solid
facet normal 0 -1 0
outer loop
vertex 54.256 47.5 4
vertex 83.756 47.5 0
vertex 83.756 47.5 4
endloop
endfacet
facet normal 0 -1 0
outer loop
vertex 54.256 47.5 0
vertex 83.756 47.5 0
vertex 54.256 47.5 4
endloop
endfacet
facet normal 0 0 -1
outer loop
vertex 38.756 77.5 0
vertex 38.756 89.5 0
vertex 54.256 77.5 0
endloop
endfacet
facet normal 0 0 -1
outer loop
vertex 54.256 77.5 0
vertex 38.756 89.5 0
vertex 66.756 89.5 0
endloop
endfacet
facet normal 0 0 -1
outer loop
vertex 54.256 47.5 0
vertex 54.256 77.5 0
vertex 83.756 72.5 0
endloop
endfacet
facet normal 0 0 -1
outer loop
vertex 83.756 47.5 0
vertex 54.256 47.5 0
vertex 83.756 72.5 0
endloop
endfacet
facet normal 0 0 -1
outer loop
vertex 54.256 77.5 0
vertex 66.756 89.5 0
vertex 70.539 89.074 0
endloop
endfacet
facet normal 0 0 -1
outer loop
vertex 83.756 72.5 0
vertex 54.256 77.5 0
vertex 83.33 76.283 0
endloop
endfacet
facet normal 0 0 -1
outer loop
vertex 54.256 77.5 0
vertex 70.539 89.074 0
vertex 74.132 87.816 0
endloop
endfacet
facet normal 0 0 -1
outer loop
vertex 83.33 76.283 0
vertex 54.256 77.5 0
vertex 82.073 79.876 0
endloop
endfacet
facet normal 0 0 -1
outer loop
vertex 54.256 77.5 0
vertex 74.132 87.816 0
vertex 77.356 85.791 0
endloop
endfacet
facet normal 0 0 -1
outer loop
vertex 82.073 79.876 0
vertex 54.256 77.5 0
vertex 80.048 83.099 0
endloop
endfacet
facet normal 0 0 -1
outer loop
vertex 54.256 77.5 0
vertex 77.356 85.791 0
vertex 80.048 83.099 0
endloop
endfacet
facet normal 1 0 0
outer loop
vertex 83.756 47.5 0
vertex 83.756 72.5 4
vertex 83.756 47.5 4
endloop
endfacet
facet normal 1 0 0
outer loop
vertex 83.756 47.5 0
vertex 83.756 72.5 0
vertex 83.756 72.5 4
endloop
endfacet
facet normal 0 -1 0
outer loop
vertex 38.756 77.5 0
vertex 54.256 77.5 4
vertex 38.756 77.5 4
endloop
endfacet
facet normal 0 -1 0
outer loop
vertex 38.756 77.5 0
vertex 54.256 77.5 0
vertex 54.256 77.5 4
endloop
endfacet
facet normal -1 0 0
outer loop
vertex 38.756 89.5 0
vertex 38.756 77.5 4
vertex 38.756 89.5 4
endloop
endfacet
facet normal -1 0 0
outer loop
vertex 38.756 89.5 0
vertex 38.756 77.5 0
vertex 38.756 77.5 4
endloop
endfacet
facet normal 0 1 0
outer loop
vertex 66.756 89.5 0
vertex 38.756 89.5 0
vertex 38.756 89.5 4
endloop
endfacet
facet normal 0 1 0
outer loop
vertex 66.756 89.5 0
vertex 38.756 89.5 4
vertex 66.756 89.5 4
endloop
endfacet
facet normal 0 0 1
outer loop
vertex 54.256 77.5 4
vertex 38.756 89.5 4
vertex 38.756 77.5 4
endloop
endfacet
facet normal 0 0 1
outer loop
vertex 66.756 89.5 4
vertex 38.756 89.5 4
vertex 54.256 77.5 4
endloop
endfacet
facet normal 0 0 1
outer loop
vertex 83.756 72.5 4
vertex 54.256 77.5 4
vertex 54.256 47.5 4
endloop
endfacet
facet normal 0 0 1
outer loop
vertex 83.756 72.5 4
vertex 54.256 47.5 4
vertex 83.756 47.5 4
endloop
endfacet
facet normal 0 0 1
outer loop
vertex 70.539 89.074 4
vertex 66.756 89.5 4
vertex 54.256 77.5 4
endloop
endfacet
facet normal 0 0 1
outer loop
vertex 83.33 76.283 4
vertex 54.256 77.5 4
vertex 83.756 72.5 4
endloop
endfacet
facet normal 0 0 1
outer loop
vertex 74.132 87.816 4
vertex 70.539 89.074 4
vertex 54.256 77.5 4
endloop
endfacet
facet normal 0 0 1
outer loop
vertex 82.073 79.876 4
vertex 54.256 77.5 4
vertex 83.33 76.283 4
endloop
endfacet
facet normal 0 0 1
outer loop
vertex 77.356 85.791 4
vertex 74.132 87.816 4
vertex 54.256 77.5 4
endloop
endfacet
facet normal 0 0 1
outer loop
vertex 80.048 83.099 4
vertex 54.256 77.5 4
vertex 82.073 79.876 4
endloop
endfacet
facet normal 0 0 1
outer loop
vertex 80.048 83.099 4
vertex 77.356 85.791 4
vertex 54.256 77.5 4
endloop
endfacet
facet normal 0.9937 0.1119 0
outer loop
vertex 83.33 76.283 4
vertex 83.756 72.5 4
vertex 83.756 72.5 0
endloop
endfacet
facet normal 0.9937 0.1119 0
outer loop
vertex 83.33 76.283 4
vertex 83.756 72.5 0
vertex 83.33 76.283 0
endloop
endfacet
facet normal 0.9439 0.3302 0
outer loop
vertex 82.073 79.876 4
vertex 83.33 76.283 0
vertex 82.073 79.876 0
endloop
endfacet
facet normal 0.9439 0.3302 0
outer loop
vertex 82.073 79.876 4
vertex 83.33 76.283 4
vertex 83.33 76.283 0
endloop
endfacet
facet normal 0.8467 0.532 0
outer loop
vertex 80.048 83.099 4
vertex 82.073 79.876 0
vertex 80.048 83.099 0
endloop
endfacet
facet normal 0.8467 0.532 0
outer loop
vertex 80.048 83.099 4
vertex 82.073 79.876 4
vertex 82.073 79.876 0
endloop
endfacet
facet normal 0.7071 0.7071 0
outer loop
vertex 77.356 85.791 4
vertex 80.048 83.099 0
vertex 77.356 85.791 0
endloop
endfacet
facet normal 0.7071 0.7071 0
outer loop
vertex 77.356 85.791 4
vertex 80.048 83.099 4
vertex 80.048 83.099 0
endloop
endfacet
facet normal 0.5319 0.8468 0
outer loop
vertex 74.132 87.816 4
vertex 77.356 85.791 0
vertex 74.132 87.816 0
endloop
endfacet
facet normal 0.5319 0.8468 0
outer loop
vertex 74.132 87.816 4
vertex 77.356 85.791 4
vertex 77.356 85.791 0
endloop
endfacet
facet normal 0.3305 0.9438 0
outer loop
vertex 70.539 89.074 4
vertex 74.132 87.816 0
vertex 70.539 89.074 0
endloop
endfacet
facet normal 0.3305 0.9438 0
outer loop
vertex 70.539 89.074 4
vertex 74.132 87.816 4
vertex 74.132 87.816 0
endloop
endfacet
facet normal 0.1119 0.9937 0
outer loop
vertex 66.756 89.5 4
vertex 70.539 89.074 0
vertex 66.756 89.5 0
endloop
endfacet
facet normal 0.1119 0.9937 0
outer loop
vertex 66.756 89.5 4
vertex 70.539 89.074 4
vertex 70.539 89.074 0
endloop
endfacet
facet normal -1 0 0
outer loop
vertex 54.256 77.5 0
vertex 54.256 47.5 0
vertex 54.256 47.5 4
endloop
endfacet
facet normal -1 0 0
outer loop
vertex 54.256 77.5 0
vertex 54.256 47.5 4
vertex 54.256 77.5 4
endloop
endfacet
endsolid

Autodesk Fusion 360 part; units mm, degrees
sketch "Sketch1" plane through (0, 0, 0) normal (0, 0, 1) x (1, 0, 0)
  line L0 (54.2564, 77.5) -> (83.7564, 77.5)
  line L1 (83.7564, 77.5) -> (83.7564, 47.5)
  line L2 (83.7564, 47.5) -> (54.2564, 47.5)
  line L3 (54.2564, 47.5) -> (54.2564, 77.5)
  line L4 (83.7564, 77.5) -> (38.7564, 77.5)
  line L5 (38.7564, 77.5) -> (38.7564, 89.5)
  line L6 (38.7564, 89.5) -> (83.7564, 89.5)
  line L7 (83.7564, 89.5) -> (83.7564, 77.5)
  dimension "d3" = 29.5
  dimension "d4" = 30
  dimension "d5" = 12
  dimension "d6" = 45
extrude "Extrude1" add sketch "Sketch1" along normal blind 4
fillet "Fillet1" radius 17 1 edges at (83.7564, 89.5, 2)
